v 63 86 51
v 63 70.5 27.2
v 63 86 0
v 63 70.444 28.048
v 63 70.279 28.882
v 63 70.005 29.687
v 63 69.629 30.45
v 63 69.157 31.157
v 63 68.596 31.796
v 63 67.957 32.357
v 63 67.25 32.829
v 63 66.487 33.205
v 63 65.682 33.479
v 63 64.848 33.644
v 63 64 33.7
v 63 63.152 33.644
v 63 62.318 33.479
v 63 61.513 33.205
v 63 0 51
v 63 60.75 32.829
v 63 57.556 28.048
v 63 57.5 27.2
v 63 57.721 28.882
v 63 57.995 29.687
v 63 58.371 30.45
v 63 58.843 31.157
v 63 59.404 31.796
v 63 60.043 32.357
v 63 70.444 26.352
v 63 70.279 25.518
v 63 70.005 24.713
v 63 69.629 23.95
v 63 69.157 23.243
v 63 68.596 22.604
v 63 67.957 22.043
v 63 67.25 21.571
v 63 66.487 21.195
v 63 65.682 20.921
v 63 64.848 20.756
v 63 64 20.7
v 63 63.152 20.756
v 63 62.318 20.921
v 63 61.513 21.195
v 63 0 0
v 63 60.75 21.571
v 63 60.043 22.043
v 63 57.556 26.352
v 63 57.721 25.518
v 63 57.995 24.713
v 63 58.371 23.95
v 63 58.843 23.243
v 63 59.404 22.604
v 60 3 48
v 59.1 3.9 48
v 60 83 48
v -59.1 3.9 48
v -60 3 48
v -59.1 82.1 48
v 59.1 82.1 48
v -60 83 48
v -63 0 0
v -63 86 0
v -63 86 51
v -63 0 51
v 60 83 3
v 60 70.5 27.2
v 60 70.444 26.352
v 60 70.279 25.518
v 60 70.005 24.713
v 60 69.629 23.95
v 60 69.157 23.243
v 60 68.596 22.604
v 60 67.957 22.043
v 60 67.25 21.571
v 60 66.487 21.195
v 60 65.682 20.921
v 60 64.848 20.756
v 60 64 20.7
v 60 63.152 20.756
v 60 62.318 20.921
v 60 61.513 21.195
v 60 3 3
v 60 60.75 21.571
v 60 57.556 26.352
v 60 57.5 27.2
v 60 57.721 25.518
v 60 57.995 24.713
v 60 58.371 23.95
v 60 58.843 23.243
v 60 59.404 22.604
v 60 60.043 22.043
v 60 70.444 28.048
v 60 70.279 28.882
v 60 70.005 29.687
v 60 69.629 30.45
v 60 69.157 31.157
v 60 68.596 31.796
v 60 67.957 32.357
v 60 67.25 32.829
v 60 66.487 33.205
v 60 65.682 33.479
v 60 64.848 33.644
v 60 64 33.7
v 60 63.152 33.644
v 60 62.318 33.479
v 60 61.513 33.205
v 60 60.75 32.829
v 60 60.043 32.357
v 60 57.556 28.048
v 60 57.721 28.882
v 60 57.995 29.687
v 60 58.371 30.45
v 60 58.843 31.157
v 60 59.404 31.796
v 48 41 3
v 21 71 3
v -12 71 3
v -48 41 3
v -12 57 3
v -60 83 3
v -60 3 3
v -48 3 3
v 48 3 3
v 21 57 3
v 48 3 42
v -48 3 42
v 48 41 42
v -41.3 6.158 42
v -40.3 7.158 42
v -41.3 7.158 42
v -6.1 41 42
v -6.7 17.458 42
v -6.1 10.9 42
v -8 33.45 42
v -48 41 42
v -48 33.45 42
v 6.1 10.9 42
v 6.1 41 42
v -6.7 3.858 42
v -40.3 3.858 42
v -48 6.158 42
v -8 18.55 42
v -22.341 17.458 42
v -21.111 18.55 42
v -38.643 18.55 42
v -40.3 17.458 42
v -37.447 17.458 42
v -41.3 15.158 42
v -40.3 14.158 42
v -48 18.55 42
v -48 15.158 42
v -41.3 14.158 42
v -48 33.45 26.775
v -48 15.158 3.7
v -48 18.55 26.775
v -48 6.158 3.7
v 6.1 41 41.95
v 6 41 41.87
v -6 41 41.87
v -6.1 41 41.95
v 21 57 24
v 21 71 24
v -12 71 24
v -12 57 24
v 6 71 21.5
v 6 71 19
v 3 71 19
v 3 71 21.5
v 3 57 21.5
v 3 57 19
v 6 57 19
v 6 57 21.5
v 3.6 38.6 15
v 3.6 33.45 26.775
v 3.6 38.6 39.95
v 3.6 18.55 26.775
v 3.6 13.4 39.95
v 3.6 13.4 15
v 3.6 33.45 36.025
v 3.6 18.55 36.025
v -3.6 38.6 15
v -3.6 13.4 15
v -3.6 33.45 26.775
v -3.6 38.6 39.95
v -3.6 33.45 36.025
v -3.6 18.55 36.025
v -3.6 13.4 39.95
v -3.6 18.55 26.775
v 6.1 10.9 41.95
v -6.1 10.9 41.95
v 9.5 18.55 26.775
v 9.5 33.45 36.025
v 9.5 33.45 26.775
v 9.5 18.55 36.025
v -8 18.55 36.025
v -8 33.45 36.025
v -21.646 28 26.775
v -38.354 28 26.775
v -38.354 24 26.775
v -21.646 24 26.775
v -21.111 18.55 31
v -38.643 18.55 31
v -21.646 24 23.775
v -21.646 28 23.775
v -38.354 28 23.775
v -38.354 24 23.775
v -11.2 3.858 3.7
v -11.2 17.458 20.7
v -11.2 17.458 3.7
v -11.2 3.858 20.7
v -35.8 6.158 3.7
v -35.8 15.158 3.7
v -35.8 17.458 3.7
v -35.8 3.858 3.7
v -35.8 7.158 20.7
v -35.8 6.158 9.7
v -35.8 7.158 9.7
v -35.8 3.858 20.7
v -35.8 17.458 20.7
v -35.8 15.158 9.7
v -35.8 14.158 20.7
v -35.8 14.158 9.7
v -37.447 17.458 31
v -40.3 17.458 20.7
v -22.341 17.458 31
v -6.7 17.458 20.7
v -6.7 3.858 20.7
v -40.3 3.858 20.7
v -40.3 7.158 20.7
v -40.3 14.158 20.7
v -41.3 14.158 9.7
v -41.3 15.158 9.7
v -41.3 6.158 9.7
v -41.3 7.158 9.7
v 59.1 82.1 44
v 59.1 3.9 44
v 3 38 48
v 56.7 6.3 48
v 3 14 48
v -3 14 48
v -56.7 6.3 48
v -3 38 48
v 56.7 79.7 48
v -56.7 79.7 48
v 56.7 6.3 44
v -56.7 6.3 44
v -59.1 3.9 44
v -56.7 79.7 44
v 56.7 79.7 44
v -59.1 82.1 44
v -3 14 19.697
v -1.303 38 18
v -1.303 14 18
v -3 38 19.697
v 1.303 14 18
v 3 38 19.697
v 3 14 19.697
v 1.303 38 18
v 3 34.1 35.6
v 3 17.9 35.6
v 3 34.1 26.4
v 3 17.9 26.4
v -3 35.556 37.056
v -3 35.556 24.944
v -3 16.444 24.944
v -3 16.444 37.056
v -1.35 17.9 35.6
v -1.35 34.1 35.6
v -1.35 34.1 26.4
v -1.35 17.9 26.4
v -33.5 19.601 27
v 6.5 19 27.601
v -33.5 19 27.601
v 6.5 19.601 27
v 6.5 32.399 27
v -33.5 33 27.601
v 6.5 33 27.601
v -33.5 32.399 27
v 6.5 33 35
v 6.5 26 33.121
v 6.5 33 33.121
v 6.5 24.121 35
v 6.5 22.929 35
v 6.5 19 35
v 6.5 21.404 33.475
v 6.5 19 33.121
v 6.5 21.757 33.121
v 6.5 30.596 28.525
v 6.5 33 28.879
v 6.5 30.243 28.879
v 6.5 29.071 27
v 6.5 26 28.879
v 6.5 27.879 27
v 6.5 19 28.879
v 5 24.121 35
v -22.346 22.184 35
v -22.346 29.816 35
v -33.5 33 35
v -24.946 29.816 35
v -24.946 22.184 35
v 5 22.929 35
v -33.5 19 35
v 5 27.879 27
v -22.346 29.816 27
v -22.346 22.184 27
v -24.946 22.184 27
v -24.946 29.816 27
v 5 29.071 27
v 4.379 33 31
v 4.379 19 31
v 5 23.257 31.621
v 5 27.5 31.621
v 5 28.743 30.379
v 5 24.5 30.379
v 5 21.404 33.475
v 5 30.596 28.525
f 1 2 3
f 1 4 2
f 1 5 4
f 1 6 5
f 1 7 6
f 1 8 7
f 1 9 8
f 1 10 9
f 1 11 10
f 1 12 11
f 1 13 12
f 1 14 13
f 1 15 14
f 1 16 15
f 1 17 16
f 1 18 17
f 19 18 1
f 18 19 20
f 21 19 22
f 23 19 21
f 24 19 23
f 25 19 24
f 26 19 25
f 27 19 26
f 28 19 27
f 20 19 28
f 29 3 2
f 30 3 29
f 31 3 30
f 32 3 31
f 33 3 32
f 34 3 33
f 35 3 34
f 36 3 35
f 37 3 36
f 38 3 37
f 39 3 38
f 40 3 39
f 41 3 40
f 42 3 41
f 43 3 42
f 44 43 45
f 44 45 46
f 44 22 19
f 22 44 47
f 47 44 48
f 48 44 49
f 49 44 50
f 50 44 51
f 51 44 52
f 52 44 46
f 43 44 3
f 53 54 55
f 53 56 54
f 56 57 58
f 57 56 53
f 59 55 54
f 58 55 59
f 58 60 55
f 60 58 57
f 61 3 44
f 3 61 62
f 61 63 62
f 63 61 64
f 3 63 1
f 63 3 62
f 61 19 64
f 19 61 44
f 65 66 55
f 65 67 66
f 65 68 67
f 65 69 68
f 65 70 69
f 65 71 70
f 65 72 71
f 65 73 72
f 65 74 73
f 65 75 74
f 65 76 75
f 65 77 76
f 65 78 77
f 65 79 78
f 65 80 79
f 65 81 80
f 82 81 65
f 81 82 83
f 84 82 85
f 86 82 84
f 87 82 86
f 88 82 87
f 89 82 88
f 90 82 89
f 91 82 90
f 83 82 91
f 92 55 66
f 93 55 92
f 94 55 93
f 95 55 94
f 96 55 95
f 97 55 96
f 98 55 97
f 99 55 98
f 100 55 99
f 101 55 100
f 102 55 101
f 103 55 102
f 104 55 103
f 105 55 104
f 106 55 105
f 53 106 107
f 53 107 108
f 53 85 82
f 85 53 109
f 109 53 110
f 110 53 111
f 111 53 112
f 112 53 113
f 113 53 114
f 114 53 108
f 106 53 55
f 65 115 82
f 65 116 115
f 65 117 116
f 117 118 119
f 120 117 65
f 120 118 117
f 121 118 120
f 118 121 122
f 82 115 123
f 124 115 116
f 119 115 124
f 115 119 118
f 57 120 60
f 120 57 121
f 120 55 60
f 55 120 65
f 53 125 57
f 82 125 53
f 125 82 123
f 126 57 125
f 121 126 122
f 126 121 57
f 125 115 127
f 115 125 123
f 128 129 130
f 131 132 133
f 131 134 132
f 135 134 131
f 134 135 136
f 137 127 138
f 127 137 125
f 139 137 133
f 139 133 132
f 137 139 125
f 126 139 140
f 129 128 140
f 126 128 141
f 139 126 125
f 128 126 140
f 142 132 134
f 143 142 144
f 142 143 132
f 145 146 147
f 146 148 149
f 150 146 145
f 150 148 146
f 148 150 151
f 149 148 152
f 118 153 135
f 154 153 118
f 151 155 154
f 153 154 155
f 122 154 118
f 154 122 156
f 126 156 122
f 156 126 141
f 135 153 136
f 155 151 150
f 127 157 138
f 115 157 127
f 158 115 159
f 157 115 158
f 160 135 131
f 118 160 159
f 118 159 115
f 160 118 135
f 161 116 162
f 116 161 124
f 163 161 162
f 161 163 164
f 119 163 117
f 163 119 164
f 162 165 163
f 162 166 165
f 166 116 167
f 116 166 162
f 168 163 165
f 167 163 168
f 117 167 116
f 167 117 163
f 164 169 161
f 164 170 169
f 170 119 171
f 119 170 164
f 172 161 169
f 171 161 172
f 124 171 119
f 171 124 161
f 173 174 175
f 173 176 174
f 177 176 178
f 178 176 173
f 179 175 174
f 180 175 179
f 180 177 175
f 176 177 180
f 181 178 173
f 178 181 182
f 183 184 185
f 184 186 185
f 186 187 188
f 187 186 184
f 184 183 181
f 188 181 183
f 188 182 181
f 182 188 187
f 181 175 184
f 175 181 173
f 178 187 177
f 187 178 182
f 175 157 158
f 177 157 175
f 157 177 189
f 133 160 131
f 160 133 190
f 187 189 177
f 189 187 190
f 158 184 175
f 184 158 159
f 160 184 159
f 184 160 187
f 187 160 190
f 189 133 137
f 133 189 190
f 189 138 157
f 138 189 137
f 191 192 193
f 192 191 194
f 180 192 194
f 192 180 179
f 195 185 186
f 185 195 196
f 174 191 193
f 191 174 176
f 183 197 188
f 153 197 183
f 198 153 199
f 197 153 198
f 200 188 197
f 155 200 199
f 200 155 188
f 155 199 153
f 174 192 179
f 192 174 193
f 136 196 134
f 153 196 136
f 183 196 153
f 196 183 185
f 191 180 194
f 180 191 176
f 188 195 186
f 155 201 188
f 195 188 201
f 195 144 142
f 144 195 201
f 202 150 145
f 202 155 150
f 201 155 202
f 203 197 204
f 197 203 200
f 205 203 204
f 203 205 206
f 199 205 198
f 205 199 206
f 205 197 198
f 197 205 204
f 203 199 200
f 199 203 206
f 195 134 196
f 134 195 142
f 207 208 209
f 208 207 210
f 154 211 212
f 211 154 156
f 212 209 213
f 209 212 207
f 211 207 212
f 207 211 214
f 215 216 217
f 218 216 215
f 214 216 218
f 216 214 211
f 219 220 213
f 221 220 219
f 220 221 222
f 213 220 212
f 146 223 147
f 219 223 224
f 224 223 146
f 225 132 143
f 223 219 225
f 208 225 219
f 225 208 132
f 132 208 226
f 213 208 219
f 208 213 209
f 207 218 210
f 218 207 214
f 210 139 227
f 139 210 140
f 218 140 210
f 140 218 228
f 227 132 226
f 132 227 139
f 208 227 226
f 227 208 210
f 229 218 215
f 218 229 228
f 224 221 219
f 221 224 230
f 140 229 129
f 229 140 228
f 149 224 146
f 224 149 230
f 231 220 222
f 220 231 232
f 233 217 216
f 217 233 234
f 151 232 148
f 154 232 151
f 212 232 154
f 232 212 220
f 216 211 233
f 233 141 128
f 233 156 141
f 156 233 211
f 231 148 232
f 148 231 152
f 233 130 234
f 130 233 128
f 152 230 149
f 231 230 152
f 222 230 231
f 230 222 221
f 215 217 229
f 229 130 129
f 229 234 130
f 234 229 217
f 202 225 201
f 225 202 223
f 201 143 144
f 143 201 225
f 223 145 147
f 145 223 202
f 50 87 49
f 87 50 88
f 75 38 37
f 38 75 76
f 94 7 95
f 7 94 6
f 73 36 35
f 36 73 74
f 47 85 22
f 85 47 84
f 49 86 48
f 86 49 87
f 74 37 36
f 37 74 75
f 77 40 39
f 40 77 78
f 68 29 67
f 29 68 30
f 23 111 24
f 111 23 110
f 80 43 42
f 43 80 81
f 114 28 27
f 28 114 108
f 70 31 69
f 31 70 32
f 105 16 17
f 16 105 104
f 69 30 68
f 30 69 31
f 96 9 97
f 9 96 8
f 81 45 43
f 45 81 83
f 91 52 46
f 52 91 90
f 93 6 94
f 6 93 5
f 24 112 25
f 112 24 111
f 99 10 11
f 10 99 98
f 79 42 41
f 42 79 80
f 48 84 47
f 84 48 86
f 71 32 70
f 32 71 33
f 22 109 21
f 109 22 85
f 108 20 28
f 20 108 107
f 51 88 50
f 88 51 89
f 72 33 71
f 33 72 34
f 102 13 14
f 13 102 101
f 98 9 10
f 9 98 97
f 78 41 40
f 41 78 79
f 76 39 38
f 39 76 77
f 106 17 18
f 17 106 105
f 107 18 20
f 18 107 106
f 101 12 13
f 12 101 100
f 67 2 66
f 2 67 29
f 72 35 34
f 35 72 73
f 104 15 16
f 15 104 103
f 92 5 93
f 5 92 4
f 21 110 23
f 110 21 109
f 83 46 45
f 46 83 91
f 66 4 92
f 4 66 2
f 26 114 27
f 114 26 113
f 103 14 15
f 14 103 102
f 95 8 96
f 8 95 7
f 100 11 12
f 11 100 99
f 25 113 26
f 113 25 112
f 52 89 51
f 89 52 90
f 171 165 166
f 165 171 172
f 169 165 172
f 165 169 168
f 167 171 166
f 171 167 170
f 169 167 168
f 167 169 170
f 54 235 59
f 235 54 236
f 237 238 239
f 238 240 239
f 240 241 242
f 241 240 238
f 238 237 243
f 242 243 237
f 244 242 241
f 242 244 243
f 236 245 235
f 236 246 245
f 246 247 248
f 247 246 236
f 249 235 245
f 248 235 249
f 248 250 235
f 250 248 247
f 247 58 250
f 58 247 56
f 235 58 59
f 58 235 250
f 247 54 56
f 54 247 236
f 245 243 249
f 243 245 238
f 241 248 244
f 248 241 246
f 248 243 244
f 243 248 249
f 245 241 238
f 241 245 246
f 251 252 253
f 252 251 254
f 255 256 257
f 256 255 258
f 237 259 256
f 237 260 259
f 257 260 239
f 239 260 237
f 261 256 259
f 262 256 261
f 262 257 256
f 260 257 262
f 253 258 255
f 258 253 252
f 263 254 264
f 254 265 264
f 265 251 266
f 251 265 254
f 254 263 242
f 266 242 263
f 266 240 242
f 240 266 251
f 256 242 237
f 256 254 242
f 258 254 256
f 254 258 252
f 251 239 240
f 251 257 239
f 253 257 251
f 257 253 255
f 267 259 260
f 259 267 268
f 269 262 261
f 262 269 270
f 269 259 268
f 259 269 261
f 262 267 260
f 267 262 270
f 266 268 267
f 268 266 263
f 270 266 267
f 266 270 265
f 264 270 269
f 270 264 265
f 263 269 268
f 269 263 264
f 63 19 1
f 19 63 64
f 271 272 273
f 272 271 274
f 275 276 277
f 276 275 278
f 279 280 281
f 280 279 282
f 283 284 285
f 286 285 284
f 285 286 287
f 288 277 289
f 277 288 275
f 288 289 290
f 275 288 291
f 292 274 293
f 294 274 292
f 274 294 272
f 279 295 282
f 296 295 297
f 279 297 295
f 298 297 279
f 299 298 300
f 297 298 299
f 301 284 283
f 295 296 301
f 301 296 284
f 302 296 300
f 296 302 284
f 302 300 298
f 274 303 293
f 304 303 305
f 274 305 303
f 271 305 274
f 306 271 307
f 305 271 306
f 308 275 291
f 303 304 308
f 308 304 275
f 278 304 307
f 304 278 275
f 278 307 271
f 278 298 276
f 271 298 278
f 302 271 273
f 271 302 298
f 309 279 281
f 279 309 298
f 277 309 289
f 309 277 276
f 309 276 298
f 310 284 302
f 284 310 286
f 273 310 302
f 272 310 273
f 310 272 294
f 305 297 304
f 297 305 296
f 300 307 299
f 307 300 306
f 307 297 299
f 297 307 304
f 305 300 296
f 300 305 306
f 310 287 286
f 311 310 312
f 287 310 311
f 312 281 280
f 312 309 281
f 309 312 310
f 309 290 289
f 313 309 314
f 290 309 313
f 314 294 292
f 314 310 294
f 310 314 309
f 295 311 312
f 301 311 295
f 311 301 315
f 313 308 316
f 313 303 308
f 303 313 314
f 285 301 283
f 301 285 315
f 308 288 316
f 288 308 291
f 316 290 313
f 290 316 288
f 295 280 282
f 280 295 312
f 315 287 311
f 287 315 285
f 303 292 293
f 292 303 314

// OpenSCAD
/* Tresorbox - eine druckbare Kiste, die ein Servo verriegelt.
 *
 * Alle Masse in Millimetern. Gedruckt werden drei Teile: Koerper, Deckel,
 * Riegel. Dazu gekauft: ein ESP32-DevKit (Sockel umschaltbar auf den kleinen
 * C3-Supermini, siehe platine), ein MG90S-Servo, ein Kondensator.
 *
 * So haelt der Verschluss:
 *   Am Deckel haengt eine Zunge nach unten - ein flaches Blatt, quer zur
 *   Fahrtrichtung des Riegels. Sie faellt in einen Schlitz im Koerper. Quer
 *   durch diesen Schlitz laeuft die Riegelbohrung. Faehrt der Riegel aus,
 *   steckt er durch das Loch in der Zunge, und der Deckel sitzt fest.
 *
 *   Die Zunge steht quer, nicht laengs. Laege sie in der Fahrtrichtung,
 *   liefe der Riegel an ihr vorbei statt hindurch.
 *
 * Warum das Servo nichts haelt:
 *   Zieht jemand am Deckel, drueckt die Zunge gegen den Riegel und der gegen
 *   die Wand seiner Bohrung. Die Kraft laeuft in den Koerper, nicht ins
 *   Getriebe. Das Servo schiebt den Riegel nur laengs, ueber einen Stift in
 *   einem Querschlitz (Kurbelschleife). Diese Bauart vertraegt Toleranzen -
 *   genau das braucht man bei gedruckten Teilen.
 *
 * Rendern:
 *   openscad -D 'teil="koerper"' -o koerper.stl tresorbox.scad
 *   openscad -D 'teil="deckel"'  -o deckel.stl  tresorbox.scad
 *   openscad -D 'teil="riegel"'  -o riegel.stl  tresorbox.scad
 *   openscad -D 'teil="pruefstueck"' -o pruefstueck.stl tresorbox.scad
 *   openscad -D 'teil="pruefriegel"' -o pruefriegel.stl tresorbox.scad   (nur der kurze Riegel)
 */

teil = "alles";              // koerper | deckel | riegel | pruefstueck | pruefriegel | alles
zustand = "zu";              // fuer die Ansicht: zu | offen
$fn = 48;

/* ---------- Was hinein soll ---------- */
innen_x = 120;               // Breite des Innenraums
innen_y = 80;                // Tiefe
innen_z = 45;                // Hoehe
/* Der Verschlussblock steht vorn ueber die volle Breite und frisst die
   ersten block_y Millimeter der Tiefe. Nutzbar ist also
   innen_x x (innen_y - block_y) x innen_z; pruefung.py rechnet es aus.

   Handy flach hinlegen: innen_x = 175, innen_y = 125, innen_z = 25.
   In der ersten Fassung stand hier innen_y = 85 - das waren nach Abzug des
   Blocks 47 mm freie Tiefe, und ein Handy ist 75 breit. Es haette nicht
   hineingepasst. Das ist ein langer Druck; fang mit der kleinen Kiste an. */

/* ---------- Druck ---------- */
wand    = 3;
boden   = 3;
rand_h  = 4;                 // wie tief der Deckelrand in die Kiste faellt

/* Spiel - getrennt nach Aufgabe.
 *
 * Erst stand hier ein einziger Wert fuer alles. Das ist der haeufigste
 * Konstruktionsfehler bei gedruckten Mechaniken: Ein Gleitsitz, ein
 * Steckfall, eine Schraubtasche und ein Deckelrand haben nichts miteinander
 * zu tun. Wer den einen Wert anpasst, bis der Riegel laeuft, macht damit den
 * Deckel wacklig.
 *
 * Grundsatz fuer die Ausrichtung: EIN Merkmal fuehrt, alle anderen sind lose.
 * Hier fuehrt die Zunge, denn nur ihre Lage entscheidet, ob der Riegel
 * trifft. Der Deckelrand haelt bloss Staub ab und ist deshalb absichtlich
 * weit - waeren beide stramm, wuerden sie gegeneinander arbeiten, und der
 * Deckel klemmte, sobald der Druck ein Zehntel daneben liegt. */
spiel_riegel = 0.45;         // Gleitsitz: Riegel in seiner Bohrung (13. 10.: 0,35 lief am
                             // ersten Pruefstueck etwas schwer)
spiel_decke  = 0.8;          // zusaetzlich oben - die Bohrungsdecke ist eine
                             // Bruecke und haengt beim Drucken durch
spiel_zunge  = 0.6;          // Steckfall: Zunge in ihren Schlitz (fuehrend; vorher 0,5)
/* Das Loch in der Zunge braucht in den beiden Achsen verschieden viel.
 *
 * Quer (Y) stapeln sich zwei Lagefehler: Der Riegel darf in seiner Bohrung
 * um 0,35 mm wandern, die Zunge in ihrem Schlitz um 0,5 mm - zusammen 0,85.
 * Weniger Loch, und der Riegel stiesse im ungluecklichen Fall stumpf gegen
 * die Zunge.
 *
 * Hoch (Z) stapelt sich nichts: Der Riegel liegt auf dem Boden seiner
 * Bohrung, der Deckel sitzt auf den Waenden. Beides ist bestimmt. Hier waere
 * viel Spiel sogar schaedlich, denn genau darum wackelt der Deckel spaeter. */
spiel_loch_y = 1.1;          // Riegel durch das Loch der Zunge, quer (>= Riegel- + Zungenspiel)
spiel_loch_z = 0.6;          // ... und hoch (mehr als der Gleitsitz)
spiel_loch   = spiel_loch_z; // Rueckfall
spiel_rand   = 0.9;          // Deckelrand - bewusst lose, weiter als die Zunge
/* Was nur sitzen muss, bekommt reichlich Spiel und wird mit Heisskleber
 * fixiert - so hat es sich im NFC-Leser-Projekt des Nutzers bewaehrt (14. 10.).
 * Genau bleibt nur, was die Mechanik ausmacht: Riegel, Bohrung, Zunge.
 *
 * Das Servo wird nicht mehr geschraubt, sondern geklebt - und zwar erst,
 * wenn Horn und Riegel schon ineinander greifen und das Servo in der Mitte
 * steht. Dann richtet es sich selbst aus; das Spiel der Tasche kostet keinen
 * Hub. */
spiel_servo  = 0.8;          // Servotasche ringsum (0,5 war am gemessenen 23-mm-Rumpf zu knapp)
spiel_servo_ende = 0.8;      // am Ende gegenueber dem Kabel - frei, seit keine Schraube mehr dahinter sitzt
spiel        = spiel_riegel; // Rueckfall fuer alte Formeln

/* ---------- Verschluss ---------- */
zunge_b    = 24;             // Zunge: Breite quer zum Riegel (Y)
zunge_d    = 6;              // Zunge: Dicke in Fahrtrichtung (X)
zunge_l    = 30;             // wie weit sie unter den Deckel reicht.
                             // Muss deutlich unter das Riegelloch reichen -
                             // bei 24 blieben darunter 2,6 mm stehen, und
                             // die waeren abgebrochen.
riegel_b   = 14;             // Riegel: Breite (Y)
riegel_h   = 8;              // Riegel: Hoehe (Z)
riegel_l   = 40;             // Riegel: Laenge (X)

/* ---------- Servo MG90S - am echten Teil gemessen (4. 10.) ----------
 *
 * Vorher standen hier Datenblattwerte eines SG90, und das Servo war nur als
 * Achse modelliert. So fiel nicht auf, dass sein Rumpf in der Bahn des
 * Riegels stand. Jetzt: gemessene Masse, und pruefung.py rechnet den Rumpf
 * gegen den Riegel. */
servo_x = 23;                // Rumpflaenge ohne Laschen - am Boden gemessen 23 x 12 (14. 10.; vorher 22, die Tasche war zu kurz)
servo_y = 12;                // Rumpfbreite
servo_z = 22;                // Boden bis Gehaeuseoberkante, ohne Wellenaufbau
servo_flansch_x = 32;        // ueber die Laschen
servo_flansch_z = 17;        // Unterseite der Laschen ueber dem Boden
servo_flansch_d = 2;         // Laschendicke
servo_loch_abstand = 27.5;   // Schraubloecher der Laschen, Mitte zu Mitte (Datenblatt)
servo_achse_versatz = 5;     // Wellenmitte von der schmalen Kante auf der Kabelseite
horn_unterseite = 10.5;      // Arm-Unterseite ueber der Gehaeuseoberkante, aufgesteckt
horn_arm = 18;               // Wellenmitte bis Armspitze
horn_luft = 1.2;             // Arm ueber der Riegeloberkante
/* Der Stift sitzt im aeussersten Loch des Horns, 16 mm von der Achse. Nur
 * so weit reicht der Arm am Rumpf vorbei bis zur Riegelmitte (siehe
 * servo_achse_y). Eine M2-Schraube statt M3: Der Arm ist 2 mm duenn, ein
 * 3-mm-Loch liesse an der Spitze kaum Material. Das 1-mm-Loch auf 1,6 mm
 * aufbohren, die Schraube schneidet ihr Gewinde selbst. */
stift_radius = 16;
stift_d = 2;
/* Der Hub soll 12,7 mm bleiben: 2 x 16 x sin(23,4) = 12,71. Als Zahl
 * eingetragen, damit pruefung.py und kurbelschleife.py sie lesen koennen. */
schwenk = 23.4;

/* Der Hub ergibt sich aus der Kurbel, nicht umgekehrt. */
riegel_weg = 2 * stift_radius * sin(schwenk);   // 12,7 mm

/* ---------- Elektronik ---------- */
/* Das Loch muss den STECKER durchlassen, nicht das Kabel. Ein USB-C-Stecker
 * misst mit Umspritzung etwa 11 x 7 mm; mit 6,5 mm bekaeme man das Kabel gar
 * nicht erst hinein, denn einfaedeln laesst es sich von keiner Seite. */
kabel_d   = 13;               // 12 + 1 mm Luft, falls die Platine nicht ganz in der Flucht klebt

/* Welche Platine eingebaut wird, entscheidet nur das Bett - nicht die Kiste.
 * Hinter dem Block liegen 120 x 42 mm freier Boden; da passt jedes gaengige
 * ESP32-Board hinein. Waehle hier, wofuer der Sockel gedruckt wird. */
platine = "devkit";          // devkit | supermini
platine_x = (platine == "devkit") ? 55 : 24;   // Laenge, zeigt zur Buchse hin
platine_y = (platine == "devkit") ? 28 : 19;   // Breite

/* Die Platine liegt auf einem schmalen Mittelsteg zwischen ihren beiden
 * Stiftreihen, nicht auf einem vollen Sockel: Die Stifte zeigen nach UNTEN
 * (gemessen am Board des Nutzers, 14. 10.: mit Stiften 12 mm hoch; die
 * Stiftleiste traegt 2,5 mm Kunststoff, darunter rund 6 mm Stift). Der erste
 * Entwurf hatte einen 4 mm hohen Vollsockel - darauf haette das Board auf
 * seinen Stiftspitzen gewackelt, und keine Dupont-Buchse haette Platz
 * gehabt.
 *
 * Hoehe: Eine Dupont-Buchse ist 14 mm lang und sitzt auf dem Stift bis an
 * die Leiste, reicht also 2,5 + 14 = 16,5 mm unter die Platine. Dazu ein paar
 * Millimeter, damit das Kabel unten seitlich abknicken kann: 21 mm. */
sockel_h  = 21;
steg_b    = (platine == "devkit") ? 14 : 7;     // zwischen den Stiftreihen (2,54 mm Raster, 22 bzw. 15 mm frei)
steg_l    = (platine == "devkit") ? 33 : 14;    // mittig; die USB-Buchse hat unten Laschen, die bleiben frei

/* Platz zwischen dem Buchsenende der Platine und der Innenwand. Ein
 * USB-Stecker ist mit Umspritzung etwa 25 mm lang und laesst sich in einem
 * 3 mm duennen Wandloch nicht um die Ecke kippen - er muss also gerade
 * einfahren und braucht die Laenge innen. */
stecker_raum = 28;

/* Lage des Platinensockels: rechts buendig minus Steckerraum, hinten an der
   Rueckwand mit 5 mm Luft. */
platine_x0    = innen_x/2 - stecker_raum - platine_x;
platine_y0    = innen_y - platine_y - 5;
platine_mitte_y = platine_y0 + platine_y/2;
buchse_z      = sockel_h + 3.2;   // Leiterplatte 1,6 + halbe Buchse

aussen_x = innen_x + 2 * wand;
aussen_y = innen_y + 2 * wand;
aussen_z = innen_z + boden;

/* ---------- Lage des Verschlusses ---------- */
block_y   = 38;              // Tiefe des Blocks: Zunge plus Servorumpf
block_b   = 96;
riegel_z  = 28;              // Hoehe der Riegelachse ueber dem Boden
zunge_y   = 23;              // Mitte der Zunge, von der Innenwand aus

/* Zwei Bedingungen bestimmen die Servoachse.
 *
 * Kinematik: Der Stift sitzt 16 mm von der Achse und schwenkt +-23,4 Grad.
 * Sein Abstand zur Achse in y schwankt dabei zwischen 14,7 und 16 mm - die
 * Achse liegt also 15,3 mm vor der Riegelmitte, dann bleibt er im
 * Querschlitz.
 *
 * Platz: Der Rumpf ist 12 mm breit und reicht bis knapp unter den Riegel.
 * Er muss deshalb ganz neben ihm stehen: 6 mm halbe Rumpfbreite, 7 mm halbe
 * Riegelbreite, dazwischen Spiel und eine Wand. Im ersten Entwurf (Stift bei
 * 9 mm, +-45 Grad) lag die Achse nur 7,7 mm neben der Riegelmitte - der
 * Rumpf ragte 5,5 mm in die Riegelbahn. Erst das gedruckte Pruefstueck hat
 * es gezeigt.
 *
 * Vorn darf die Tasche nicht durch die Wand brechen. Deshalb sitzt die
 * Zunge 23 mm tief (vorher 20). */
servo_achse_x = -30;
servo_achse_y = zunge_y - (stift_radius * (1 + cos(schwenk)) / 2);
/* Hoehe: Der Hornarm muss ueber den Riegel hinweg, mit horn_luft Abstand. */
servo_oben    = riegel_z + riegel_h / 2 + horn_luft - horn_unterseite;
servo_unten   = servo_oben - servo_z;
servo_mitte_x = servo_achse_x - servo_achse_versatz + servo_x / 2;
kabel_kanal_b = 9;
kabel_kanal_h = 6;
kabel_steig_b = 7;           // senkrechter Schlitz durch die Laschenstufe fuer den Kabelansatz (Ansatz ~4,5 mm)
/* Bis hierher (x) ist der Kabelkanal nach oben offen - 1 mm vor der Laschenstufe. */
kabel_schlitz_bis = servo_mitte_x - servo_flansch_x / 2 - spiel_servo - 1;

/* Die Bohrung ist unten knapp und oben weit.
 *
 * Der Riegel liegt durch die Schwerkraft ohnehin auf dem Boden der Bohrung;
 * nur dort braucht es einen Gleitsitz. Die Decke ueberbrueckt 14 mm und sackt
 * beim Drucken um zwei bis drei Zehntel durch - gaebe man ihr dasselbe Spiel,
 * klemmte der Riegel genau in der Mitte seines Weges. */
bohrung_b  = riegel_b + 2 * spiel_riegel;
bohrung_h  = riegel_h + spiel_riegel + spiel_decke;
bohrung_z0 = riegel_z - riegel_h / 2 - spiel_riegel / 2;   // Unterkante

/* Wo die Riegelspitze steht, wenn zu.
 *
 * Der Hub ist durch die Kurbel festgelegt (12,7 mm), also bestimmt diese eine
 * Zahl beide Endlagen. Sie muss zwei Bedingungen erfuellen: verriegelt ganz
 * durch die Zunge hindurch, offen sicher davor. Beim ersten Entwurf stand
 * hier zunge_d/2 + 7 - dann blieben offen 0,3 mm Luft vor der Zunge, und der
 * Deckel waere nicht abgegangen. */
riegel_spitze_zu = zunge_d / 2 + 3.5;
/* Bis hierher (x) ist die Bohrung links der Zunge oben offen, siehe koerper(). */
einlege_ende = -(zunge_d / 2 + 5);
schlitz_von_links = riegel_l - (riegel_spitze_zu - servo_achse_x) + stift_radius * sin(schwenk);

/* ---------- Gemeinsame Aussparungen ----------
 *
 * Bohrung und Zungenschlitz stecken in eigenen Modulen, weil das Pruefstueck
 * sie benutzt. Baute man es aus eigenem Code nach, pruefte es seine eigene
 * Kopie und nicht die Kiste. */

module bohrung_cut(von_x, laenge) {
  union() {
    translate([von_x, wand + zunge_y - bohrung_b/2, boden + bohrung_z0])
      cube([laenge, bohrung_b, bohrung_h]);
    /* Freigang fuer den Mitnehmerstift unter der Bohrung. Ohne ihn muesste
     * die Schraube auf ein Zehntel genau abgelaengt werden: zu kurz greift
     * sie nicht, zu lang schlaegt sie auf dem Boden auf. */
    translate([servo_achse_x - stift_radius * sin(schwenk) - stift_d,
               wand + zunge_y - (stift_d + 2)/2, boden + bohrung_z0 - 3])
      cube([2 * stift_radius * sin(schwenk) + 2 * stift_d, stift_d + 2, 4]);
  }
}

module zungenschlitz_cut() {
  union() {
    translate([-(zunge_d + 2*spiel_zunge)/2, wand + zunge_y - (zunge_b + 2*spiel_zunge)/2,
               boden + innen_z - zunge_l - 3])
      cube([zunge_d + 2*spiel_zunge, zunge_b + 2*spiel_zunge, zunge_l + 12]);
    /* Trichter am Schlitzmund: faengt die Zunge auf, wenn der Deckel schief
     * aufgesetzt wird. */
    /* Er sitzt auf der Blockoberkante, nicht unter dem Deckel: Der Block
     * endet rand_h + 2 mm tiefer. Frueher lag der Trichter dort oben in der
     * Luft und schnitt nichts. */
    translate([0, wand + zunge_y, boden + innen_z - rand_h - 2 - 2])
      hull() {
        translate([0, 0, 2]) cube([zunge_d + 2*spiel_zunge + 5, zunge_b + 2*spiel_zunge + 5, 0.1], center = true);
        cube([zunge_d + 2*spiel_zunge, zunge_b + 2*spiel_zunge, 0.1], center = true);
      }
  }
}

module koerper() {
  /* Reihenfolge ist hier alles: erst die Huelle aushoehlen, DANN den Block
   * hineinstellen, dann die Aussparungen abziehen. Zieht man den Innenraum
   * von Huelle und Block gemeinsam ab, verschwindet der Block mit - er steht
   * ja genau darin. Beim ersten Entwurf kam die Kiste leer aus dem Renderer. */
  difference() {
    union() {
      difference() {
        translate([-aussen_x/2, 0, 0]) cube([aussen_x, aussen_y, aussen_z]);
        translate([-innen_x/2, wand, boden]) cube([innen_x, innen_y, innen_z + 1]);
      }
      // 2 mm unter dem Deckelrand bleiben, sonst setzt der Deckel auf dem
      // Block auf statt auf den Waenden
      translate([-block_b/2, wand, boden]) cube([block_b, block_y, innen_z - rand_h - 2]);

      // Mittelsteg fuer die Platine
      translate([platine_x0 + (platine_x - steg_l) / 2, wand + platine_mitte_y - steg_b / 2, boden])
        cube([steg_l, steg_b, sockel_h]);
    }

    zungenschlitz_cut();
    // Links offen, damit sich der Riegel von innen einschieben laesst
    bohrung_cut(-block_b/2 - 1, block_b/2 + riegel_spitze_zu + 4);
    /* Einlegerinne: Links der Zunge ist die Bohrung nach oben offen.
     *
     * Vorher war sie ein geschlossener Tunnel, der am linken Blockende
     * begann - "von innen links einschieben" hiess es. Dort sind zwischen
     * Block und Wand aber nur 12 mm Platz, und der Riegel ist 40 mm lang.
     * In der fertigen Kiste haette er sich nie einsetzen lassen.
     *
     * Die Decke braucht es nur an der Zunge: Zieht jemand am Deckel, drueckt
     * die Zunge den Riegel nach oben, und links wie rechts von ihr muss er
     * sich an der Decke abstuetzen. Weiter links traegt sie nichts. Der
     * Riegel wird von oben in die Rinne gelegt und nach rechts in den kurzen
     * Tunnel geschoben; die untere Haelfte der Bohrung fuehrt ihn weiter. */
    translate([-block_b/2 - 1, wand + zunge_y - bohrung_b/2, boden + riegel_z])
      cube([block_b/2 + 1 + einlege_ende, bohrung_b, innen_z]);

    // Servotasche, nach oben offen: Rumpf von oben einsetzen
    translate([servo_achse_x - servo_achse_versatz - spiel_servo,
               wand + servo_achse_y - servo_y/2 - spiel_servo, boden + servo_unten])
      cube([servo_x + spiel_servo + spiel_servo_ende, servo_y + 2*spiel_servo, innen_z]);
    /* Die Laschen liegen auf einer Stufe; gehalten wird das Servo von den
     * zwei Schrauben, die mitgeliefert werden. */
    translate([servo_mitte_x - servo_flansch_x/2 - spiel_servo,
               wand + servo_achse_y - servo_y/2 - spiel_servo, boden + servo_unten + servo_flansch_z])
      cube([servo_flansch_x + 2*spiel_servo, servo_y + 2*spiel_servo, innen_z]);
    /* Keine Schraubloecher mehr: Das Servo wird auf die Laschenstufe
     * geklebt (Heisskleber, zwei Tropfen je Lasche). Auf der Kabelseite liefe
     * eine Schraube ohnehin in den Schlitz. */
    /* Das Kabel kommt an der Wellenseite heraus, 4 mm ueber dem Rumpfboden.
     * Nach oben kann es dort nicht: Genau darueber liegt die Lasche mit ihrem
     * Schraubloch. Ein erster Entwurf hatte dort einen senkrechten Schlitz -
     * das Kabel waere gegen die Lasche gelaufen, und die Schraube haette ins
     * Leere gegriffen.
     *
     * Deshalb laeuft es unten waagerecht aus dem Block: ein Kanal auf
     * Kabelhoehe, unter der Laschenstufe ein kurzes Stueck geschlossen,
     * links davon nach oben offen, damit man das Kabel samt Stecker einlegen
     * kann. Es tritt am linken Blockende aus, wo zwischen Block und Wand Platz
     * ist. 9 mm breit und 6 mm hoch: Der dreipolige Stecker (etwa 8 x 2,6 mm)
     * passt flach hindurch. */
    translate([-block_b/2 - 1, wand + servo_achse_y - kabel_kanal_b/2, boden + servo_unten])
      cube([block_b/2 + 1 + servo_achse_x - servo_achse_versatz - spiel_servo + 0.1, kabel_kanal_b, kabel_kanal_h]);
    translate([-block_b/2 - 1, wand + servo_achse_y - kabel_kanal_b/2, boden + servo_unten])
      cube([kabel_schlitz_bis - (-block_b/2 - 1), kabel_kanal_b, innen_z]);
    /* Der Kabelansatz steht an der Stirnseite ab. Setzt man das Servo von
     * oben ein, muss er an der Laschenstufe vorbei - bisher war die dort
     * geschlossen, und das Servo liess sich nur hineinhebeln (14. 10.). Jetzt
     * ein senkrechter Schlitz durch die Stufe bis hinunter in den Kanal; die
     * Lasche liegt beidseits davon auf zwei Polstern. */
    translate([kabel_schlitz_bis - 0.1, wand + servo_achse_y - kabel_steig_b/2, boden + servo_unten])
      cube([servo_achse_x - servo_achse_versatz - spiel_servo - kabel_schlitz_bis + 0.2, kabel_steig_b, innen_z]);

    /* Freiraum fuer den Hornarm: ein Faecher, nicht ein Kreis. Der Arm ist
     * 18 mm lang und schwenkt nur +-23,4 Grad zum Riegel hin; ein voller
     * Kreis wuerde die Vorderwand anschneiden. Der Rand ist reichlich, weil
     * der Arm an der Nabe breiter ist. Er beginnt auf halber Riegelhoehe:
     * Darunter fuehrt die Bohrung den Riegel weiter. */
    translate([servo_achse_x, wand + servo_achse_y, boden + riegel_z])
      linear_extrude(innen_z)
        union() {
          circle(r = 6.5);
          polygon(concat([[0, 0]], [for (w = [90 - schwenk - 25 : 4 : 90 + schwenk + 25.1])
            [(horn_arm + 2) * cos(w), (horn_arm + 2) * sin(w)]]));
        }

    // Kabeldurchlass in der rechten Wand, auf Hoehe der USB-Buchse und in
    // einer Flucht mit ihr. Vorher sass er in der Rueckwand - der Stecker
    // waere quer zur Buchse angekommen und haette sich nicht einfaedeln
    // lassen.
    translate([innen_x/2 - 1, wand + platine_mitte_y, boden + buchse_z])
      rotate([0, 90, 0]) cylinder(d = kabel_d, h = wand + 3);

    // Kabelbinder-Tunnel quer durch den Steg, knapp unter der Platine
    translate([platine_x0 + platine_x/2 - 1.5, wand + platine_mitte_y - steg_b/2 - 1, boden + sockel_h - 5])
      cube([3, steg_b + 2, 2.5]);
  }
}

/* ---------- Zwischenboden ----------
 * Eine Platte auf vier Beinen ueber der Elektronik, hinter dem Block. Sie
 * gibt den Inhalt eine ebene Flaeche - ein paar Schluessel liegen nicht auf
 * Platine und Kabeln - und verdeckt, was darunter liegt. Herausnehmbar: Mit
 * dem Griffloch hebt man sie an. Die Beine stehen da, wo nichts laeuft: nicht
 * auf der Platine, nicht im USB-Stecker, nicht im Servokabel (das laeuft an
 * der linken Wand und auf Platinenhoehe quer herueber). Gedruckt wird sie
 * kopfueber, Platte auf dem Bett - ohne Stuetzen. */
zb_luft   = 1.0;                                        // ringsum zu Wand und Block - steht lose
zb_d      = 2;                                          // Plattendicke
zb_unten  = buchse_z + 3.5 + 1;                         // ueber dem eingesteckten USB-Stecker (7 mm hoch) mit 1 mm Luft
zb_x      = innen_x - 2 * zb_luft;
zb_y      = innen_y - block_y - 2 * zb_luft;
zb_bein   = 6;
/* Beinpositionen (Mitte, innen_x-Koordinaten, y ab Blockrueckseite) */
zb_beine  = [[-45, 4], [-45, zb_y - 4], [53, 4], [53, zb_y - 4]];

module zwischenboden() {
  difference() {
    union() {
      cube([zb_x, zb_y, zb_d]);
      for (b = zb_beine)
        translate([b[0] + zb_x/2 - zb_bein/2, b[1] - zb_bein/2, 0]) cube([zb_bein, zb_bein, zb_unten + zb_d]);
    }
    // Griffloch, zum Herausheben
    translate([zb_x/2 - 12, zb_y/2 - 5, -1]) cube([24, 10, zb_d + 2]);
  }
}

module zunge() {
  difference() {
    translate([-zunge_d/2, wand + zunge_y - zunge_b/2, -zunge_l])
      cube([zunge_d, zunge_b, zunge_l]);

    /* Loch fuer den Riegel, mit Trichter auf der Seite, aus der er kommt.
     * Ohne den muesste der Deckel auf ein Zehntel genau sitzen: Haengt er
     * durch Schmutz oder eine dicke erste Schicht zwei Zehntel zu hoch,
     * stiesse der Riegel stumpf gegen die Zunge statt hindurchzugleiten. */
    translate([-zunge_d/2 - 1, wand + zunge_y - (riegel_b + 2*spiel_loch_y)/2,
               -(innen_z - riegel_z) - (riegel_h + 2*spiel_loch_z)/2])
      cube([zunge_d + 2, riegel_b + 2*spiel_loch_y, riegel_h + 2*spiel_loch_z]);
    translate([-zunge_d/2, wand + zunge_y, -(innen_z - riegel_z)])
      hull() {
        translate([-0.1, 0, 0])
          cube([0.1, riegel_b + 2*spiel_loch_y + 3, riegel_h + 2*spiel_loch_z + 3], center = true);
        translate([1.6, 0, 0])
          cube([0.1, riegel_b + 2*spiel_loch_y, riegel_h + 2*spiel_loch_z], center = true);
      }

    /* Anfasung an der Spitze der Zunge: faedelt in den Schlitz ein. */
    for (sx = [-1, 1])
      translate([sx * zunge_d/2, wand + zunge_y, -zunge_l])
        rotate([0, 45, 0]) cube([2.4, zunge_b + 2, 2.4], center = true);
  }
}

module deckel() {
  union() {
    translate([-aussen_x/2, 0, 0]) cube([aussen_x, aussen_y, wand]);
    /* Rand: bewusst lose. Er haelt Staub ab und begrenzt das seitliche
     * Rutschen - fuehren tut die Zunge. */
    translate([-innen_x/2 + spiel_rand, wand + spiel_rand, -rand_h])
      difference() {
        cube([innen_x - 2*spiel_rand, innen_y - 2*spiel_rand, rand_h]);
        translate([2.4, 2.4, -1])
          cube([innen_x - 2*spiel_rand - 4.8, innen_y - 2*spiel_rand - 4.8, rand_h + 2]);
      }
    zunge();
  }
}

module riegel() {
  difference() {
    cube([riegel_l, riegel_b, riegel_h], center = true);
    // Querschlitz fuer den Mitnehmerstift
    translate([-riegel_l/2 + schlitz_von_links, 0, 0])
      cube([stift_d + 0.6, 2 * stift_radius * (1 - cos(schwenk)) + stift_d + 3, riegel_h + 2],
           center = true);
    /* Fase an der Spitze - faedelt in das Loch der Zunge ein, auch wenn der
     * Deckel ein Zehntel zu hoch sitzt. Rundum, nicht nur oben und unten. */
    translate([riegel_l/2, 0, 0]) rotate([0, 45, 0])
      cube([3, riegel_b + 2, 3], center = true);
    translate([riegel_l/2, 0, 0]) rotate([45, 0, 0])
      cube([3, 3, riegel_h + 2], center = true);
    /* Fase an den unteren Laengskanten: Die erste Schicht wird beim Drucken
     * breitgequetscht ("Elefantenfuss"), und genau diese Kante reibt in der
     * Bohrung. 0,6 mm nehmen sie weg. */
    for (sy = [-1, 1])
      translate([0, sy * riegel_b / 2, -riegel_h / 2]) rotate([45, 0, 0])
        cube([riegel_l + 2, 0.85, 0.85], center = true);
  }
}

module baugruppe() {
  spitze = (zustand == "zu") ? riegel_spitze_zu : riegel_spitze_zu - riegel_weg;
  koerper();
  color("SteelBlue") translate([0, 0, boden + innen_z]) deckel();
  color("Goldenrod")
    translate([spitze - riegel_l/2, wand + zunge_y, boden + riegel_z]) riegel();
}

/* Nur der Verschluss, ohne Kistenwaende - zur Kontrolle der Bewegung. */
module mechanik() {
  spitze = (zustand == "zu") ? riegel_spitze_zu : riegel_spitze_zu - riegel_weg;
  intersection() {
    koerper();
    translate([-block_b/2 - 1, 0, boden + 8]) cube([block_b + 2, block_y + wand, innen_z]);
  }
  color("SteelBlue")
    translate([-zunge_d/2, wand + zunge_y - zunge_b/2, boden + innen_z - zunge_l])
      difference() {
        cube([zunge_d, zunge_b, zunge_l]);
        translate([-1, zunge_b/2 - (riegel_b + 2*spiel)/2, zunge_l - (innen_z - riegel_z) - (riegel_h + 2*spiel)/2])
          cube([zunge_d + 2, riegel_b + 2*spiel, riegel_h + 2*spiel]);
      }
  color("Crimson")
    translate([spitze - riegel_l/2, wand + zunge_y, boden + riegel_z]) riegel();
  // Servoachse und Stift als Marken
  color("DimGray") translate([servo_achse_x, wand + servo_achse_y, boden + riegel_z - 6])
    cylinder(d = 4, h = 24);
  color("Lime") translate([servo_achse_x + stift_radius * sin(zustand == "zu" ? schwenk : -schwenk),
                           wand + servo_achse_y + stift_radius * cos(schwenk),
                           boden + riegel_z - riegel_h/2])
    cylinder(d = stift_d, h = riegel_h);
}

/* ---------- Pruefstueck ----------
 *
 * Ein Ausschnitt des Blocks mit Bohrung und Zungenschlitz, dazu ein kurzer
 * Riegel und eine kurze Zunge. Druckt in etwa 20 Minuten statt in sechs
 * Stunden und beantwortet die einzige Frage, die sich vorher nicht rechnen
 * laesst: ob DEIN Drucker diese Passungen trifft.
 *
 * Es benutzt dieselben Module wie die Kiste. Baute man es nach, pruefte es
 * seine eigene Kopie. */
/* Der kurze Riegel des Pruefstuecks: gekuerzt am HINTEREN Ende, damit Spitze,
 * Fase und Querschlitz im selben Abstand bleiben wie am langen. Frueher war
 * er am falschen Ende gekappt - von Hand geschoben fiel das nicht auf, mit
 * Servo aber blieb die Spitze 8 mm vor der Zunge stehen und haette nie
 * verriegelt. Liegend, Unterseite auf z = 0. */
pruef_riegel_von = -riegel_l/2 + schlitz_von_links - (stift_d + 0.6)/2 - 3;   // 3 mm hinter dem Querschlitz
pruef_riegel_l   = riegel_l/2 - pruef_riegel_von;
module pruefriegel() {
  translate([-(pruef_riegel_von + pruef_riegel_l/2), 0, riegel_h/2])
    intersection() {
      riegel();
      translate([pruef_riegel_von + pruef_riegel_l/2, 0, 0])
        cube([pruef_riegel_l, riegel_b + 2, riegel_h + 2], center = true);
    }
}

module pruefstueck() {
  scheibe = zunge_b + 12;
  /* Volle Blockhoehe, vom Innenboden an: Das Servo haengt mit seinem Rumpf
   * bis fast auf den Boden. Frueher war das Stueck nur 21 mm hoch - die
   * Laschenauflage waere dabei abgeschnitten worden. */
  schnitt_z = boden;
  vorn  = wand + servo_achse_y - servo_y/2 - spiel_servo - 3;          // 3 mm Wand vor der Tasche
  links = servo_mitte_x - servo_flansch_x/2 - spiel_servo - 3;         // 3 mm hinter der Laschenauflage
  /* Ausschnitt des Blocks um Servo, Zunge und Riegelbohrung, auf null
   * gesetzt - ein Ausschnitt behaelt sonst seine urspruengliche Hoehe und
   * schwebt im Slicer ueber der Platte. Er enthaelt die ganze Servotasche
   * mit Laschenauflage und Kabelkanal: Klone streuen, und das merkt man
   * lieber am Pruefstueck als an der fertigen Kiste. */
  translate([0, 0, -schnitt_z])
    intersection() {
      koerper();
      /* Nur bis zur Blockoberkante: Darueber stuende sonst ein duenner
       * Streifen der Kistenwand hoch. */
      translate([links, vorn, boden])
        cube([(riegel_spitze_zu + 10) - links, wand + zunge_y + scheibe/2 - vorn, innen_z - rand_h - 2]);
    }
  /* Riegel und Zunge liegen daneben, mit Abstand zur Hinterkante des
   * Ausschnitts - nicht zu scheibe gerechnet. Der Ausschnitt beginnt bei
   * wand + zunge_y - scheibe/2, nicht bei null; so lag die Zunge frueher
   * 4 mm tief im Block und wurde mit ihm zu einem Teil verschmolzen. */
  hinten = wand + zunge_y + scheibe/2;
  abstand = 6;
  // kurzer Riegel daneben
  translate([0, hinten + abstand + riegel_b/2, 0]) pruefriegel();
  /* Kurze Zunge mit Schulter. Ohne Deckel fiele sie bis auf den
   * Schlitzboden, 3 mm tiefer als in der Kiste - dann traefe der Riegel ihr
   * Loch nicht, und der Test sagte nichts. Die Schulter liegt auf der
   * Blockoberkante, wo sonst der Deckel die Zunge haelt, und setzt sie auf
   * genau die Hoehe, auf der sie in der Kiste haengt.
   *
   * Gedruckt wird sie auf der Schulter, Spitze nach oben - so, wie die Zunge
   * am Deckel entsteht. Damit prueft das Stueck auch die Bruecke ueber dem
   * Riegelloch, und die Schulter gibt ihr einen breiten Fuss. Frueher stand
   * hier ein 6 mm duennes Blatt hochkant, und ueber dem Loch blieb ein halber
   * Millimeter Material. */
  luft = rand_h + 2;                       // Deckelunterseite ueber der Blockoberkante
  schulter_h = 3;
  schulter_d = zunge_d + 12;
  schulter_b = zunge_b + 12;
  translate([-34, hinten + abstand + schulter_b/2, -(luft - schulter_h)])
    mirror([0, 0, 1])
      translate([0, -(wand + zunge_y), 0])
        union() {
          intersection() {
            zunge();
            translate([-zunge_d, wand + zunge_y - zunge_b, -zunge_l - 1])
              cube([2 * zunge_d, 2 * zunge_b, zunge_l + 1 - luft]);
          }
          translate([-schulter_d/2, wand + zunge_y - schulter_b/2, -luft])
            cube([schulter_d, schulter_b, schulter_h]);
        }
}

if (teil == "pruefstueck") pruefstueck();
else if (teil == "pruefriegel") pruefriegel();
else if (teil == "mechanik") mechanik();
else if (teil == "koerper") koerper();
else if (teil == "deckel") deckel();
else if (teil == "riegel") riegel();
else if (teil == "zwischenboden") zwischenboden();          // kopfueber: Platte unten, Beine nach oben
else if (teil == "alles") baugruppe();   // "nichts": fuer kollision.scad
